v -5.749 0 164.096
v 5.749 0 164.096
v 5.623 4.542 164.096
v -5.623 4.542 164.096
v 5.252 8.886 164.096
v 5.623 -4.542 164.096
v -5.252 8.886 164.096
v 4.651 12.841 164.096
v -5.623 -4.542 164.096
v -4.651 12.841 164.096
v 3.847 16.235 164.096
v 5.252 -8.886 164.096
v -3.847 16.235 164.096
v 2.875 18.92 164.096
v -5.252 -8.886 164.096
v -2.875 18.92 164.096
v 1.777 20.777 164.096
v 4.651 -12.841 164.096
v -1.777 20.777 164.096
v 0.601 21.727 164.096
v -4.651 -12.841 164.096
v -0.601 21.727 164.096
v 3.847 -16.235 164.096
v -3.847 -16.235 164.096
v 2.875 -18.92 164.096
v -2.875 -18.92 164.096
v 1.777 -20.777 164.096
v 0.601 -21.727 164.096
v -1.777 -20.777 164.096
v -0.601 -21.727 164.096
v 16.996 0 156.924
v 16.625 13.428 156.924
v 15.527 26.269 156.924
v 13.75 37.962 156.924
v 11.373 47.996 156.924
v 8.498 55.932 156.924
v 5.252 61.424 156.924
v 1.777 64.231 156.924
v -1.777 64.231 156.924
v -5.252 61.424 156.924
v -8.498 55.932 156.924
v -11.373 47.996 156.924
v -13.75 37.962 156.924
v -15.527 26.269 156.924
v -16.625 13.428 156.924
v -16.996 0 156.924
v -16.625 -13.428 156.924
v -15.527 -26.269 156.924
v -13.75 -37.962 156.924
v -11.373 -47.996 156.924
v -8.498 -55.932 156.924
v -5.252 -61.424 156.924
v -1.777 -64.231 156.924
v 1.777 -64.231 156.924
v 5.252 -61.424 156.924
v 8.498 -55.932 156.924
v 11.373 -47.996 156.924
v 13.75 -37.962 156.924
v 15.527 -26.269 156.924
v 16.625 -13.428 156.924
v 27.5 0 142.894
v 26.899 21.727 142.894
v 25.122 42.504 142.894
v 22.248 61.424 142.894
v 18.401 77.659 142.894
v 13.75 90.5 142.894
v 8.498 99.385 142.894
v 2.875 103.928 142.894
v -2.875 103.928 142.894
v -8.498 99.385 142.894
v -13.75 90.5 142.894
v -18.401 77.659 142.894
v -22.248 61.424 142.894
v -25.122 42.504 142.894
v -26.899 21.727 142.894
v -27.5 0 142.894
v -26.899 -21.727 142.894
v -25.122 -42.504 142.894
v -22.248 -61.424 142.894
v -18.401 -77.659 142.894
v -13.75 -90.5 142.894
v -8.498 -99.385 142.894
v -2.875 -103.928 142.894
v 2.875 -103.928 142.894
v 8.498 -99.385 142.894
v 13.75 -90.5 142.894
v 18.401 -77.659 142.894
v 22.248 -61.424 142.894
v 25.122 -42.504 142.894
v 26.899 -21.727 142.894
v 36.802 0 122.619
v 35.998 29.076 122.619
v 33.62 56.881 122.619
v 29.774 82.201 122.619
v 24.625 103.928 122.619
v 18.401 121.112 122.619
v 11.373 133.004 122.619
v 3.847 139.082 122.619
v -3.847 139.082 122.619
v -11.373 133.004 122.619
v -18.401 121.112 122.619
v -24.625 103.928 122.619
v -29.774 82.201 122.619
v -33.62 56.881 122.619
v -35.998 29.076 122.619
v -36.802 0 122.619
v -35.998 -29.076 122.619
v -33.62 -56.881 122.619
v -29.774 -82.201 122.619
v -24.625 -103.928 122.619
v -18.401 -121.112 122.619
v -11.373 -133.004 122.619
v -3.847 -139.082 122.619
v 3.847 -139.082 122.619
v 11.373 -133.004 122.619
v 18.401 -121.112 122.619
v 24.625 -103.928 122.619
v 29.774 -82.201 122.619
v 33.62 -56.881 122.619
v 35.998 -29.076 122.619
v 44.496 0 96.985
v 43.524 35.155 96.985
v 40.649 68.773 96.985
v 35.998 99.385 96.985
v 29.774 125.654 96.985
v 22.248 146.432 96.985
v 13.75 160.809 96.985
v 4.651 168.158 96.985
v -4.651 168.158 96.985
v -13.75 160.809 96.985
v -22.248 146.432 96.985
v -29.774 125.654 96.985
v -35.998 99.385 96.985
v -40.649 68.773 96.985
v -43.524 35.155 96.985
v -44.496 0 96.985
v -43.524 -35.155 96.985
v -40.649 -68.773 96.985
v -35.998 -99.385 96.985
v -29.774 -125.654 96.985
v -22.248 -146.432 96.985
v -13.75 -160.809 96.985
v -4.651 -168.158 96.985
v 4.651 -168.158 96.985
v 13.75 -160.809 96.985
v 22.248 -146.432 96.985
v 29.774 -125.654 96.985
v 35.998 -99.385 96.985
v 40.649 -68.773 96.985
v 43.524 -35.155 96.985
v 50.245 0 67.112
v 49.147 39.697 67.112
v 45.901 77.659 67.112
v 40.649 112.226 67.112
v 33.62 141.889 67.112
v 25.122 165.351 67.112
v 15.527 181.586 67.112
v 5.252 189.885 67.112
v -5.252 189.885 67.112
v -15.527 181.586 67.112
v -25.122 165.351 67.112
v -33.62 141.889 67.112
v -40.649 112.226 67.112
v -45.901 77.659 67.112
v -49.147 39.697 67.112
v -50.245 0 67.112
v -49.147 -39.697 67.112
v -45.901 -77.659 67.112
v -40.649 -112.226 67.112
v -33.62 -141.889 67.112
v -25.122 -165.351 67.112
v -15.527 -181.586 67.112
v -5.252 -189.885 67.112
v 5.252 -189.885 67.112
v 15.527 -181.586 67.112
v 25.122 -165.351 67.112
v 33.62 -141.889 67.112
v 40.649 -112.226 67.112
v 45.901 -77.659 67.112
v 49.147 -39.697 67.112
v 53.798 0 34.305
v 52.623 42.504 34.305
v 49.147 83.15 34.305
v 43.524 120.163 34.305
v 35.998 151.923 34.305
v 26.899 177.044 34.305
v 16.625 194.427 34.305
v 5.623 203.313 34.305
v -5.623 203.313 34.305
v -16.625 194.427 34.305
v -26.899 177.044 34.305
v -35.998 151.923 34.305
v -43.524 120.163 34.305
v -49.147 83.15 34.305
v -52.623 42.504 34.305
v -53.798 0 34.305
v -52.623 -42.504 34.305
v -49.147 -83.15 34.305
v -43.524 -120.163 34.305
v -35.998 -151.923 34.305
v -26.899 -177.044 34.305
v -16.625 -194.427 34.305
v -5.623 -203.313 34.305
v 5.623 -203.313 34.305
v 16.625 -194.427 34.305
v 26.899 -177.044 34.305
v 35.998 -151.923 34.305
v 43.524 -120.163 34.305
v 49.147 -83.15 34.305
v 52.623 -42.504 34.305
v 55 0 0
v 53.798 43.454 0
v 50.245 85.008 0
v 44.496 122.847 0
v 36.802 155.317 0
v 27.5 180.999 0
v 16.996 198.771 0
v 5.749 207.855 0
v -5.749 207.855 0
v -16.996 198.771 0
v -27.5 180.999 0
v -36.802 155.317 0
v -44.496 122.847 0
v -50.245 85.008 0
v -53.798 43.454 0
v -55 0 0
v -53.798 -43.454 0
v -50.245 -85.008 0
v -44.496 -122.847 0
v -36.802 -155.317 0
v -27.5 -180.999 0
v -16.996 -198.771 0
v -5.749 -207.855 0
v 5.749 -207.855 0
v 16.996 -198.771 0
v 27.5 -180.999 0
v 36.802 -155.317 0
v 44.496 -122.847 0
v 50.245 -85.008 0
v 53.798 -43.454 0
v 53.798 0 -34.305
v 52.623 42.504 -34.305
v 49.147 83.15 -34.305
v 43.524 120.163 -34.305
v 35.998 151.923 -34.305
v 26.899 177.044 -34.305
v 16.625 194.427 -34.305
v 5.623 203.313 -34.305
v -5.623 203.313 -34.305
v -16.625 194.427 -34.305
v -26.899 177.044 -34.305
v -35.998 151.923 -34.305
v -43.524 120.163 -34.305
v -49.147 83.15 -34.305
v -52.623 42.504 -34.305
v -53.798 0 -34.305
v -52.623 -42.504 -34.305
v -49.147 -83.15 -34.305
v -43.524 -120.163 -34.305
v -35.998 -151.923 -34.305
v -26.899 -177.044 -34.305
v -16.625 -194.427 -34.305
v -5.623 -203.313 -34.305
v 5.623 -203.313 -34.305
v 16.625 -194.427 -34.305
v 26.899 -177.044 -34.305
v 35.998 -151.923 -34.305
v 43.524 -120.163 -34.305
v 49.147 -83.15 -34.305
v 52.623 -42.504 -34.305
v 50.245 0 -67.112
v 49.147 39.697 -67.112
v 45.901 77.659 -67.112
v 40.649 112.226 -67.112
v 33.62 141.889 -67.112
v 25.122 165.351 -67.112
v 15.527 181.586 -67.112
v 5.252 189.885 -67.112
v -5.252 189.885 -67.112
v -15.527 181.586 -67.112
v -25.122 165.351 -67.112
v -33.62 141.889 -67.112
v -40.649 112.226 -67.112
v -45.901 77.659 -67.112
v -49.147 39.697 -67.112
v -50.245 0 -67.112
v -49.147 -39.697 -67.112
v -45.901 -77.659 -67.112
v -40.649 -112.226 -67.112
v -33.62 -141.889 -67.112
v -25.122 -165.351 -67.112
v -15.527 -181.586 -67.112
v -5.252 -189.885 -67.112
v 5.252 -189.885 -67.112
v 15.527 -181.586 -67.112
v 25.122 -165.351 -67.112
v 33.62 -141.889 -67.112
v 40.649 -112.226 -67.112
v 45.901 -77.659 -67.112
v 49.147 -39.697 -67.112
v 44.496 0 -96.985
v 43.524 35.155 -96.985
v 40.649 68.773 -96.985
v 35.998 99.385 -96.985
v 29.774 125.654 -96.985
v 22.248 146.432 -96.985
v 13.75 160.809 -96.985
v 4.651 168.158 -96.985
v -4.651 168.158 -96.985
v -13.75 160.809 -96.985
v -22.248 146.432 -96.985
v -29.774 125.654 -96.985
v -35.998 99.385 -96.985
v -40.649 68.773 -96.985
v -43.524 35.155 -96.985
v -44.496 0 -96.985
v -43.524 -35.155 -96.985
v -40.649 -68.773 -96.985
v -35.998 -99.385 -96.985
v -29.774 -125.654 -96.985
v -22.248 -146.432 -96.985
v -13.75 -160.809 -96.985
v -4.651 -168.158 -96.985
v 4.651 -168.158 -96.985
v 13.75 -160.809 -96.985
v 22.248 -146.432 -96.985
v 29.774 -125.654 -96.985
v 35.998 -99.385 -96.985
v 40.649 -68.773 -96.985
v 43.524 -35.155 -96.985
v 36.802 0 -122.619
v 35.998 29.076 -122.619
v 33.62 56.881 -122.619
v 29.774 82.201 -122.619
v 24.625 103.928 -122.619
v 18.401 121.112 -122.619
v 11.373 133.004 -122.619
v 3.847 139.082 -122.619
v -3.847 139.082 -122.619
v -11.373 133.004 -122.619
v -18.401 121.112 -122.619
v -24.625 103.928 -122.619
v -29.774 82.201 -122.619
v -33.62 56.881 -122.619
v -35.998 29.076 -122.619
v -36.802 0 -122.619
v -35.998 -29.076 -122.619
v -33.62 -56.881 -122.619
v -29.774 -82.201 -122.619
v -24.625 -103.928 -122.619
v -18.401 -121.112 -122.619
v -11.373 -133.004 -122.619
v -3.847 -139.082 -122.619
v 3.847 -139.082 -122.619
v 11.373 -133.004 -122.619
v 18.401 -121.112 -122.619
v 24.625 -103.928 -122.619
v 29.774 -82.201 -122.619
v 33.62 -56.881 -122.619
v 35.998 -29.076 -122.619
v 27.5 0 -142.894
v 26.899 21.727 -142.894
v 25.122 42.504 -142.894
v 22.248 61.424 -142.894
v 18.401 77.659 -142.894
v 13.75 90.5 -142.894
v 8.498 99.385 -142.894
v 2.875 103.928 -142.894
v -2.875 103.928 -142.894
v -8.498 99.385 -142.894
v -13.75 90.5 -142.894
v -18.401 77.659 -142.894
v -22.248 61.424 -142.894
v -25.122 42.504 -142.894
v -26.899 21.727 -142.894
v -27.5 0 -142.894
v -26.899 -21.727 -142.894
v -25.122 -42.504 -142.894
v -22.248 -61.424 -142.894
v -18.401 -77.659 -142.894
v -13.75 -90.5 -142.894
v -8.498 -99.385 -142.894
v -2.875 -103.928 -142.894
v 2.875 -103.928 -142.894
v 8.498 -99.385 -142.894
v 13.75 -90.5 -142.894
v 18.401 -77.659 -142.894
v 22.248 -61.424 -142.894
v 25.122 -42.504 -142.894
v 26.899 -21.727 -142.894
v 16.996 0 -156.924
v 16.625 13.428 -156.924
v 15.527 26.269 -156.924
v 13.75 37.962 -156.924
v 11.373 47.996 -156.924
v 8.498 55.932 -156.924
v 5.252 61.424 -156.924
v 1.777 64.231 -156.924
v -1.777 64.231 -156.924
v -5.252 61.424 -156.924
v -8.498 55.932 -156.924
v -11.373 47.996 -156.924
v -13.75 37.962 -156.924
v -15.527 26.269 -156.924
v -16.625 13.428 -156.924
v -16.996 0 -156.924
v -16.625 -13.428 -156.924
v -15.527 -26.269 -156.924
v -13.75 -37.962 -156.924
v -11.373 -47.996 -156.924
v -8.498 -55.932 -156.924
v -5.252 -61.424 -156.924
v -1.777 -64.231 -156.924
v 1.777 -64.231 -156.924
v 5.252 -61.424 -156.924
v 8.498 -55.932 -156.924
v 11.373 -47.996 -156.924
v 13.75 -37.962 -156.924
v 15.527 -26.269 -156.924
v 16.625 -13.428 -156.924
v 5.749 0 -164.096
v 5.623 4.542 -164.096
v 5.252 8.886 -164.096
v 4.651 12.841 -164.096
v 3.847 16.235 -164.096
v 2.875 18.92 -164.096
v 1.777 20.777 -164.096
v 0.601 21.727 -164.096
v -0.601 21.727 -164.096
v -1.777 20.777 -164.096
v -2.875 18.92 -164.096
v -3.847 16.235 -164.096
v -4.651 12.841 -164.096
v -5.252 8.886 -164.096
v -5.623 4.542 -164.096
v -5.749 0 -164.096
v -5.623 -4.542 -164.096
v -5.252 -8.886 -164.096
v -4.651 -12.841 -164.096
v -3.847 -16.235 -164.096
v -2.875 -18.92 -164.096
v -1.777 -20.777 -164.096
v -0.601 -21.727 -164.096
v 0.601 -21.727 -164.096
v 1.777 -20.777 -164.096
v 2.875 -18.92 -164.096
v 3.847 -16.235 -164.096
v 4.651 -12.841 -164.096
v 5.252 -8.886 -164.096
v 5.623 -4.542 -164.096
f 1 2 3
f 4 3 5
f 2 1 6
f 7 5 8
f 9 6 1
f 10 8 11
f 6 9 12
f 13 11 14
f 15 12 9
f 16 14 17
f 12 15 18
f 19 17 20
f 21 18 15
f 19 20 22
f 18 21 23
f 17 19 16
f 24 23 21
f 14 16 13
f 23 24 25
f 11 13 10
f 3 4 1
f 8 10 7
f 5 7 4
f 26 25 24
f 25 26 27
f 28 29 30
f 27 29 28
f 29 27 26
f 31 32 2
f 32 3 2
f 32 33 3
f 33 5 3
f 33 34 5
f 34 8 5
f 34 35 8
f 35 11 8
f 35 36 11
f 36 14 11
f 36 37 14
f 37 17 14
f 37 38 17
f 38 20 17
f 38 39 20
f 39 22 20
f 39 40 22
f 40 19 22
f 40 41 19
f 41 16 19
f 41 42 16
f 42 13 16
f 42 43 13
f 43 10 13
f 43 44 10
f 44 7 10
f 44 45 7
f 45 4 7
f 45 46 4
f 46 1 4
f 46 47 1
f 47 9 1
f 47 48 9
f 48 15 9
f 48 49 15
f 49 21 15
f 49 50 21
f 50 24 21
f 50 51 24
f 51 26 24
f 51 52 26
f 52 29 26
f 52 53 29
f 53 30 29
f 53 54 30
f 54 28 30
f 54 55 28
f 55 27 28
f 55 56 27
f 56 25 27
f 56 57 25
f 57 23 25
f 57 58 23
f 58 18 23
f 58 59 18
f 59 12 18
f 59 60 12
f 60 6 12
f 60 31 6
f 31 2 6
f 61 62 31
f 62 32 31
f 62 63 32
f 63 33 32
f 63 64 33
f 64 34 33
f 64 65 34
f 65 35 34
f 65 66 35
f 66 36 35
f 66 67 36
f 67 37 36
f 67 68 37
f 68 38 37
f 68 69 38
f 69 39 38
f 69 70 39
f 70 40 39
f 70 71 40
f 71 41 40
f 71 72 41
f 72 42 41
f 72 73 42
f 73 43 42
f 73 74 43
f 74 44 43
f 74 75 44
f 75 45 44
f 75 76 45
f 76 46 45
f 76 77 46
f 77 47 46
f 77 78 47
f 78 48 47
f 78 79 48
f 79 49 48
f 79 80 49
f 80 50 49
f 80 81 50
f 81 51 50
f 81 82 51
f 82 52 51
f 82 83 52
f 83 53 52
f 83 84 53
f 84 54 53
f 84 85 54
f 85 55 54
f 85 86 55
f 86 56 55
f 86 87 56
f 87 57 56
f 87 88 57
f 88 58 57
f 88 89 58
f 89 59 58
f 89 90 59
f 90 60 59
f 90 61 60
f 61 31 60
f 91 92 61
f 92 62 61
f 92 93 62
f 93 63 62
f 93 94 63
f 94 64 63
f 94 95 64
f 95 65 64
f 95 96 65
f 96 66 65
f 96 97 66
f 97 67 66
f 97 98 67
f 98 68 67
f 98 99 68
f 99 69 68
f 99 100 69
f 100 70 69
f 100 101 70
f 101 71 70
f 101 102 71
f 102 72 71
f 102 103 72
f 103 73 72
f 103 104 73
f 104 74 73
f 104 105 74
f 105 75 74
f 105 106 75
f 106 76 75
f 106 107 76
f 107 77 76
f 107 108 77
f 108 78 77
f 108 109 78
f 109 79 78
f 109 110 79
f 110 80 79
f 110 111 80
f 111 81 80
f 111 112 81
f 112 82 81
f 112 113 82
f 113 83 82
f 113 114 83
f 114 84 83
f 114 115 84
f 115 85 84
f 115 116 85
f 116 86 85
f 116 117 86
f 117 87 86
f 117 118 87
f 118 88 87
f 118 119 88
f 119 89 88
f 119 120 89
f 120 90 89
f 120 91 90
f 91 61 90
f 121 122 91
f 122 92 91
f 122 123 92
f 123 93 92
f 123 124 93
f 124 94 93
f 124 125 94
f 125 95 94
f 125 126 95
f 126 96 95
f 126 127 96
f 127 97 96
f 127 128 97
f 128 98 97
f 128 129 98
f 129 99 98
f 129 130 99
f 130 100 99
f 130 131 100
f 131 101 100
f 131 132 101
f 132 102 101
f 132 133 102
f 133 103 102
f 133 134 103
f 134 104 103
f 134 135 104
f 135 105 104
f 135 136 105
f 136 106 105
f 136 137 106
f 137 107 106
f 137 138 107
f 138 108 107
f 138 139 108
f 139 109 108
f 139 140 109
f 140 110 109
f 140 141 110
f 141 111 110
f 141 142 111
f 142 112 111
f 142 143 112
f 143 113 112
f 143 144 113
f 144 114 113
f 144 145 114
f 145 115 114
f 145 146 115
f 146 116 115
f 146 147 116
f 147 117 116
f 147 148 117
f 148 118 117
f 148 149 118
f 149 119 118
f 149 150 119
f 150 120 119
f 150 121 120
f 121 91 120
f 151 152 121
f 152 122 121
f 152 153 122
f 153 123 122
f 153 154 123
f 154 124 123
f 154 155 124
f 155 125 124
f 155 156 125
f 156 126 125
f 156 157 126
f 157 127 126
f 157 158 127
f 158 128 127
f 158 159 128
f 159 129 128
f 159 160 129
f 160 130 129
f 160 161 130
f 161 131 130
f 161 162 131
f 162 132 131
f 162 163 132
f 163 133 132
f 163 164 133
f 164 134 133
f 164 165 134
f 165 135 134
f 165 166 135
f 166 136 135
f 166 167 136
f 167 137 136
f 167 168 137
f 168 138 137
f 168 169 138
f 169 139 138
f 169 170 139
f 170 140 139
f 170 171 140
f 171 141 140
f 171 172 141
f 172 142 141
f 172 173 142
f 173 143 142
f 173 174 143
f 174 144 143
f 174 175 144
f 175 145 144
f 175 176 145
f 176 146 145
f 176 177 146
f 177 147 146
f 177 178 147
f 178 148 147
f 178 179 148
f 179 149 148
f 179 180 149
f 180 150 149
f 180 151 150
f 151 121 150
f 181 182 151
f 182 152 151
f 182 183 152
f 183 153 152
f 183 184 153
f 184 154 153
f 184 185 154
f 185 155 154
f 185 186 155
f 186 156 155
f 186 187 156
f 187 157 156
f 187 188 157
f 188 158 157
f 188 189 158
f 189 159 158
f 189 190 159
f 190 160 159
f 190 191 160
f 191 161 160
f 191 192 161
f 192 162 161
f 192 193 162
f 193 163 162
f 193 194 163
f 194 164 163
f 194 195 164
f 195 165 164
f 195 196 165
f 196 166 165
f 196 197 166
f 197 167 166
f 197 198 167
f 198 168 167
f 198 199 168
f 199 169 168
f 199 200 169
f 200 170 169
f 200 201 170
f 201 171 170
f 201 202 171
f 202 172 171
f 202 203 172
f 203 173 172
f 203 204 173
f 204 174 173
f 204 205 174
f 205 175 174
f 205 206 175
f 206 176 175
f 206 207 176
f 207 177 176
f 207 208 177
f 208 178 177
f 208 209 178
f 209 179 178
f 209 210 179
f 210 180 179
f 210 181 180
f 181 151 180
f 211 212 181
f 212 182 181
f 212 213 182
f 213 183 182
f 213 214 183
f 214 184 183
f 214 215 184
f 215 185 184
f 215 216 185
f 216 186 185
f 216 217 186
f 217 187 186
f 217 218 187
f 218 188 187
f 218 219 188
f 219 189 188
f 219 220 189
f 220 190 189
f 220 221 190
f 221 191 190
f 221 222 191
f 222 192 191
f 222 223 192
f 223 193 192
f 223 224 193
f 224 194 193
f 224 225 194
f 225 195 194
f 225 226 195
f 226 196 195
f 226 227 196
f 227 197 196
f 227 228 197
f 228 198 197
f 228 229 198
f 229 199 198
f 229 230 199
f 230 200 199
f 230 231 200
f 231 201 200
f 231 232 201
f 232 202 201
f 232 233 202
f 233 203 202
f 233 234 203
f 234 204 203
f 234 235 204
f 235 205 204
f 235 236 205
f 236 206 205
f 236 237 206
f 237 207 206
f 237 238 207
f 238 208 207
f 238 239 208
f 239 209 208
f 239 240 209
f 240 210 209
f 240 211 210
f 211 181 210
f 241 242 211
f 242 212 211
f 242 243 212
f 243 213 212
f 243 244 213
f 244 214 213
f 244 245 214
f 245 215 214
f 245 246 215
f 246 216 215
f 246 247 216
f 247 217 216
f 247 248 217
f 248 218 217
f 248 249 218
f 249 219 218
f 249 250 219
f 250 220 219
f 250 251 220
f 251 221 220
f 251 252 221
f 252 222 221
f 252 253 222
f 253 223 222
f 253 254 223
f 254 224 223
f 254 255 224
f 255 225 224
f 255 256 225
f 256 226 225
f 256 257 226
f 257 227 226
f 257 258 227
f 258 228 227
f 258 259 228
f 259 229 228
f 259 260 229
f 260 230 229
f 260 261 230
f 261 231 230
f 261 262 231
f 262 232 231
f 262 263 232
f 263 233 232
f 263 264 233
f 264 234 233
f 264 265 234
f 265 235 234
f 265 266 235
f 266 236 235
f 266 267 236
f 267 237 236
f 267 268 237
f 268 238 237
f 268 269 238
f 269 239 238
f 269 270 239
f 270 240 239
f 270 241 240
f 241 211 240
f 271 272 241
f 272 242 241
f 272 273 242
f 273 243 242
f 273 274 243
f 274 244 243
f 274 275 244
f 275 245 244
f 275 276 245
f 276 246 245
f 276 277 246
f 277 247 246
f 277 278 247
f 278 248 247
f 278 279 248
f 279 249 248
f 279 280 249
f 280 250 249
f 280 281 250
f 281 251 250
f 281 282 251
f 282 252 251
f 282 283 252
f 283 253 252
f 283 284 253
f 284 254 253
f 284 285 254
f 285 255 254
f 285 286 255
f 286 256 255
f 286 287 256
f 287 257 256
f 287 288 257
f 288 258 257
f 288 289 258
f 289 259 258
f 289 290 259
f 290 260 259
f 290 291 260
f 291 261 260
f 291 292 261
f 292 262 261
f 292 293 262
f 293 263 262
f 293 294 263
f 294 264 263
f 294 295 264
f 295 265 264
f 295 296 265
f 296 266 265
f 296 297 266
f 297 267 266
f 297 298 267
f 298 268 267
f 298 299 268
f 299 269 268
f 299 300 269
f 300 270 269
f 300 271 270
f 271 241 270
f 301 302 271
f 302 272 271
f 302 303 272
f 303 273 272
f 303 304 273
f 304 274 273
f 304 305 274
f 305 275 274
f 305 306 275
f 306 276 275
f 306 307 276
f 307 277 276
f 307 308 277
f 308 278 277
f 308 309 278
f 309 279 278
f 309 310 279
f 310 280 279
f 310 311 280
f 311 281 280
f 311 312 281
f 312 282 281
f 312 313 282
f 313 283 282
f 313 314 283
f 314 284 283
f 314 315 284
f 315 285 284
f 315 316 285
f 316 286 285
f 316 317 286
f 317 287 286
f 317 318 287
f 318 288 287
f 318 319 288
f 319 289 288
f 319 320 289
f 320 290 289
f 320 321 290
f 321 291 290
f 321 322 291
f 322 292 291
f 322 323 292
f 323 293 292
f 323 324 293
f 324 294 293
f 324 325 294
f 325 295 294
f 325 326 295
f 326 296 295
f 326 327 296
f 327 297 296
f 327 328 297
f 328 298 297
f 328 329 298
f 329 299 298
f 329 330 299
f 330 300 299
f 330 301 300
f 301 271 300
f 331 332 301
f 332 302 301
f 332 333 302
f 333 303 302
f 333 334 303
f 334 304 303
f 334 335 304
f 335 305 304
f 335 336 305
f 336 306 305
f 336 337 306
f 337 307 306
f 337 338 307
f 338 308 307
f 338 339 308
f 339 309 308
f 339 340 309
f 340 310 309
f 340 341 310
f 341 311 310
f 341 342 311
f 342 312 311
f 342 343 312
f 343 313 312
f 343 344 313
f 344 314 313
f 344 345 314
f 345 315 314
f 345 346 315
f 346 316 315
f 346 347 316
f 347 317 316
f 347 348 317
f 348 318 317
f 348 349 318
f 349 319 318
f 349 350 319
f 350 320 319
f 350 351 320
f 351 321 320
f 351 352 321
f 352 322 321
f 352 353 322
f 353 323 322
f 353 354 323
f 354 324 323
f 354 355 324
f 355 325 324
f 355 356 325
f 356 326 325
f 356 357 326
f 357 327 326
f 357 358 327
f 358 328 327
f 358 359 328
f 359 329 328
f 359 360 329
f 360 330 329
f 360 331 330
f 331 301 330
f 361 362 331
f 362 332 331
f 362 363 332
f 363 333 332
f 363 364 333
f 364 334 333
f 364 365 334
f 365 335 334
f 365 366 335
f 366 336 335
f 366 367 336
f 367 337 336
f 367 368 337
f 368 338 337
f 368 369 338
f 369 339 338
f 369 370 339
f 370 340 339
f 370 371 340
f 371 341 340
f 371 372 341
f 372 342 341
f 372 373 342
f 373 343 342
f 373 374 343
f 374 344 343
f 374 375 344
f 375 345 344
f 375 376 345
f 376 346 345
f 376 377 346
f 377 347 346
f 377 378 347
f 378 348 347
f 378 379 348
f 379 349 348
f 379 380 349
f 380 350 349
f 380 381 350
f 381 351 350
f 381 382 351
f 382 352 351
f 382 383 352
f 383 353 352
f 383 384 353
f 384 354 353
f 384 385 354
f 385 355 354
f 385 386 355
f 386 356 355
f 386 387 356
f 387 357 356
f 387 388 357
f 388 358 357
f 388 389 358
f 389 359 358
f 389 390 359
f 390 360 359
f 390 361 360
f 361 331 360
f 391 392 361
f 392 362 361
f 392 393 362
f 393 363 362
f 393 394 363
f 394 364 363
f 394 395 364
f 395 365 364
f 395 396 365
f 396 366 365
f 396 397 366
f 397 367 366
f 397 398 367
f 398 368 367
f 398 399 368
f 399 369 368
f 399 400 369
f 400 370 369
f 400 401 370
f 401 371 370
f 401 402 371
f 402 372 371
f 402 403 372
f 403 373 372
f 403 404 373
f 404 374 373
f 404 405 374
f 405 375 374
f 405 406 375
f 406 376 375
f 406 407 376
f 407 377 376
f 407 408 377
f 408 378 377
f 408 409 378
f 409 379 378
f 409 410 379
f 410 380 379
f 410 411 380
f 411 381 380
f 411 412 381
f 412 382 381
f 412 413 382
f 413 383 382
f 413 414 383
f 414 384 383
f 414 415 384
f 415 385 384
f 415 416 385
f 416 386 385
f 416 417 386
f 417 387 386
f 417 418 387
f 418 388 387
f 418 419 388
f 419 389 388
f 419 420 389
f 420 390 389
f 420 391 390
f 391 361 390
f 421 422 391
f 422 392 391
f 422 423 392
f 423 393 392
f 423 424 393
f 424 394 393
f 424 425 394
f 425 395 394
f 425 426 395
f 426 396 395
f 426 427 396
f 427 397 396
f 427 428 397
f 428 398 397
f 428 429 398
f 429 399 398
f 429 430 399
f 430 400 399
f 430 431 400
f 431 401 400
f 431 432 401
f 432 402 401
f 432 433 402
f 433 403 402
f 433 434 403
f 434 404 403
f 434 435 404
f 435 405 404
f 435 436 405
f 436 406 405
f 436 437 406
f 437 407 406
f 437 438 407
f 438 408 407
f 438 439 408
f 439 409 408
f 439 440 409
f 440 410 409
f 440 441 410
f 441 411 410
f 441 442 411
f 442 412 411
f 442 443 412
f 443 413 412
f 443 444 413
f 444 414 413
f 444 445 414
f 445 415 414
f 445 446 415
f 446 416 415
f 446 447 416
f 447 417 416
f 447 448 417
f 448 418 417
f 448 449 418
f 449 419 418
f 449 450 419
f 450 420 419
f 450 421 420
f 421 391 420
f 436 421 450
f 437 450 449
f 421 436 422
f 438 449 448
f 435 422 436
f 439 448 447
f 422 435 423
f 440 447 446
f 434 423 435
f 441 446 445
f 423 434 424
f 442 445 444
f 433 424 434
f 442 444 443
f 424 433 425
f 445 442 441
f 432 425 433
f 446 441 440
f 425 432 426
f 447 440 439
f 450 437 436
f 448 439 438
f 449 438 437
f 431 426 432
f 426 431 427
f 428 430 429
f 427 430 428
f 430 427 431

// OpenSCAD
// Generated by SolidPython 1.0.1 on 2020-07-29 00:46:47


scale(v = [5, 19, 15]) {
	sphere(r = 11);
}
/***********************************************
*********      SolidPython code:      **********
************************************************
 
# import packages: SolidPython
from solid import *
from solid.utils import *
from itertools import chain, combinations, permutations


class Resize:

    def __init__(self, scad_file):
        self.scad_file = scad_file
        #self.scad_file = import_scad(scad_file)
        # cone/cylinder param:
        self.r1 = 0
        self.r2 = 0
        self.h = 0
        # rectangular prism param:
        self.w = 0
        self.l = 0
        # ellipse param:
        self.r = 0

    # import OpenScad code (file name corresponds to shape)


    # classify shape + parameters
    def assign(self, param1, param2, param3):
        if self.scad_file == 'cone.scad':
            self.r1 = param1
            self.r2 = param2
            self.h = param3
        elif self.scad_file == 'cylinder.scad':
            self.r1 = param1
            self.r2 = param2
            self.h = param3
        elif self.scad_file == 'rectangularPrism.scad':
            self.h = param1
            self.l = param2
            self.w = param3
        else:
            self.r = param1
            self.h = param2

    # resize parameters
    def iterate(self):
        x = range(3, 20, 2)
        i = 1
        if self.scad_file == 'cone.scad':
            tempList = list(permutations(x, 2))
            for temp in tempList:
                param1 = temp[0]
                param2 = temp[1]
                filepath = 'produced_scad_files/' + 'cone' + str(param1) + '_' + str(param2) + '_' + '.scad'
                scad_render_to_file(cylinder(h=param1, r1=param2, r2=0), filepath)

        elif self.scad_file == 'cylinder.scad':
            tempList = list(permutations(x, 3))
            for temp in tempList:
                param1 = temp[0]
                param2 = temp[1]
                filepath = 'produced_scad_files/' + 'cylinder' + str(param1) + '_' + str(param2) + '_' + '.scad'
                scad_render_to_file(cylinder(h=param1, r1=param2, r2=param2), filepath)

        elif self.scad_file == 'rectangularPrism.scad':
            tempList = list(permutations(x, 3))
            for temp in tempList:
                param1 = temp[0]
                param2 = temp[1]
                param3 = temp[2]
                filepath = 'produced_scad_files/' + 'rectangularPrism' + str(param1) + '_' + str(param2) + '_' + str(
                    param3) + '.scad'
                scad_render_to_file(cube(size=(param1, param2, param3)), filepath)

        elif self.scad_file == 'ellipse.scad':
            tempList = list(permutations(x, 4))
            for temp in tempList:
                param1 = temp[0]
                param2 = temp[1]
                param3 = temp[2]
                param4 = temp[3]
                filepath = 'produced_scad_files/' + 'ellipse' + str(param1) + '_' + str(param2) + '_' + str(param3) + '_' + str(param4) + '.scad'
                scad_render_to_file(scale([param1, param2, param3])(sphere(r=param4)), filepath)

    def render_to_scadfile(self):
        scad_render_to_file(scad, 'example.scad') 
 
************************************************/
